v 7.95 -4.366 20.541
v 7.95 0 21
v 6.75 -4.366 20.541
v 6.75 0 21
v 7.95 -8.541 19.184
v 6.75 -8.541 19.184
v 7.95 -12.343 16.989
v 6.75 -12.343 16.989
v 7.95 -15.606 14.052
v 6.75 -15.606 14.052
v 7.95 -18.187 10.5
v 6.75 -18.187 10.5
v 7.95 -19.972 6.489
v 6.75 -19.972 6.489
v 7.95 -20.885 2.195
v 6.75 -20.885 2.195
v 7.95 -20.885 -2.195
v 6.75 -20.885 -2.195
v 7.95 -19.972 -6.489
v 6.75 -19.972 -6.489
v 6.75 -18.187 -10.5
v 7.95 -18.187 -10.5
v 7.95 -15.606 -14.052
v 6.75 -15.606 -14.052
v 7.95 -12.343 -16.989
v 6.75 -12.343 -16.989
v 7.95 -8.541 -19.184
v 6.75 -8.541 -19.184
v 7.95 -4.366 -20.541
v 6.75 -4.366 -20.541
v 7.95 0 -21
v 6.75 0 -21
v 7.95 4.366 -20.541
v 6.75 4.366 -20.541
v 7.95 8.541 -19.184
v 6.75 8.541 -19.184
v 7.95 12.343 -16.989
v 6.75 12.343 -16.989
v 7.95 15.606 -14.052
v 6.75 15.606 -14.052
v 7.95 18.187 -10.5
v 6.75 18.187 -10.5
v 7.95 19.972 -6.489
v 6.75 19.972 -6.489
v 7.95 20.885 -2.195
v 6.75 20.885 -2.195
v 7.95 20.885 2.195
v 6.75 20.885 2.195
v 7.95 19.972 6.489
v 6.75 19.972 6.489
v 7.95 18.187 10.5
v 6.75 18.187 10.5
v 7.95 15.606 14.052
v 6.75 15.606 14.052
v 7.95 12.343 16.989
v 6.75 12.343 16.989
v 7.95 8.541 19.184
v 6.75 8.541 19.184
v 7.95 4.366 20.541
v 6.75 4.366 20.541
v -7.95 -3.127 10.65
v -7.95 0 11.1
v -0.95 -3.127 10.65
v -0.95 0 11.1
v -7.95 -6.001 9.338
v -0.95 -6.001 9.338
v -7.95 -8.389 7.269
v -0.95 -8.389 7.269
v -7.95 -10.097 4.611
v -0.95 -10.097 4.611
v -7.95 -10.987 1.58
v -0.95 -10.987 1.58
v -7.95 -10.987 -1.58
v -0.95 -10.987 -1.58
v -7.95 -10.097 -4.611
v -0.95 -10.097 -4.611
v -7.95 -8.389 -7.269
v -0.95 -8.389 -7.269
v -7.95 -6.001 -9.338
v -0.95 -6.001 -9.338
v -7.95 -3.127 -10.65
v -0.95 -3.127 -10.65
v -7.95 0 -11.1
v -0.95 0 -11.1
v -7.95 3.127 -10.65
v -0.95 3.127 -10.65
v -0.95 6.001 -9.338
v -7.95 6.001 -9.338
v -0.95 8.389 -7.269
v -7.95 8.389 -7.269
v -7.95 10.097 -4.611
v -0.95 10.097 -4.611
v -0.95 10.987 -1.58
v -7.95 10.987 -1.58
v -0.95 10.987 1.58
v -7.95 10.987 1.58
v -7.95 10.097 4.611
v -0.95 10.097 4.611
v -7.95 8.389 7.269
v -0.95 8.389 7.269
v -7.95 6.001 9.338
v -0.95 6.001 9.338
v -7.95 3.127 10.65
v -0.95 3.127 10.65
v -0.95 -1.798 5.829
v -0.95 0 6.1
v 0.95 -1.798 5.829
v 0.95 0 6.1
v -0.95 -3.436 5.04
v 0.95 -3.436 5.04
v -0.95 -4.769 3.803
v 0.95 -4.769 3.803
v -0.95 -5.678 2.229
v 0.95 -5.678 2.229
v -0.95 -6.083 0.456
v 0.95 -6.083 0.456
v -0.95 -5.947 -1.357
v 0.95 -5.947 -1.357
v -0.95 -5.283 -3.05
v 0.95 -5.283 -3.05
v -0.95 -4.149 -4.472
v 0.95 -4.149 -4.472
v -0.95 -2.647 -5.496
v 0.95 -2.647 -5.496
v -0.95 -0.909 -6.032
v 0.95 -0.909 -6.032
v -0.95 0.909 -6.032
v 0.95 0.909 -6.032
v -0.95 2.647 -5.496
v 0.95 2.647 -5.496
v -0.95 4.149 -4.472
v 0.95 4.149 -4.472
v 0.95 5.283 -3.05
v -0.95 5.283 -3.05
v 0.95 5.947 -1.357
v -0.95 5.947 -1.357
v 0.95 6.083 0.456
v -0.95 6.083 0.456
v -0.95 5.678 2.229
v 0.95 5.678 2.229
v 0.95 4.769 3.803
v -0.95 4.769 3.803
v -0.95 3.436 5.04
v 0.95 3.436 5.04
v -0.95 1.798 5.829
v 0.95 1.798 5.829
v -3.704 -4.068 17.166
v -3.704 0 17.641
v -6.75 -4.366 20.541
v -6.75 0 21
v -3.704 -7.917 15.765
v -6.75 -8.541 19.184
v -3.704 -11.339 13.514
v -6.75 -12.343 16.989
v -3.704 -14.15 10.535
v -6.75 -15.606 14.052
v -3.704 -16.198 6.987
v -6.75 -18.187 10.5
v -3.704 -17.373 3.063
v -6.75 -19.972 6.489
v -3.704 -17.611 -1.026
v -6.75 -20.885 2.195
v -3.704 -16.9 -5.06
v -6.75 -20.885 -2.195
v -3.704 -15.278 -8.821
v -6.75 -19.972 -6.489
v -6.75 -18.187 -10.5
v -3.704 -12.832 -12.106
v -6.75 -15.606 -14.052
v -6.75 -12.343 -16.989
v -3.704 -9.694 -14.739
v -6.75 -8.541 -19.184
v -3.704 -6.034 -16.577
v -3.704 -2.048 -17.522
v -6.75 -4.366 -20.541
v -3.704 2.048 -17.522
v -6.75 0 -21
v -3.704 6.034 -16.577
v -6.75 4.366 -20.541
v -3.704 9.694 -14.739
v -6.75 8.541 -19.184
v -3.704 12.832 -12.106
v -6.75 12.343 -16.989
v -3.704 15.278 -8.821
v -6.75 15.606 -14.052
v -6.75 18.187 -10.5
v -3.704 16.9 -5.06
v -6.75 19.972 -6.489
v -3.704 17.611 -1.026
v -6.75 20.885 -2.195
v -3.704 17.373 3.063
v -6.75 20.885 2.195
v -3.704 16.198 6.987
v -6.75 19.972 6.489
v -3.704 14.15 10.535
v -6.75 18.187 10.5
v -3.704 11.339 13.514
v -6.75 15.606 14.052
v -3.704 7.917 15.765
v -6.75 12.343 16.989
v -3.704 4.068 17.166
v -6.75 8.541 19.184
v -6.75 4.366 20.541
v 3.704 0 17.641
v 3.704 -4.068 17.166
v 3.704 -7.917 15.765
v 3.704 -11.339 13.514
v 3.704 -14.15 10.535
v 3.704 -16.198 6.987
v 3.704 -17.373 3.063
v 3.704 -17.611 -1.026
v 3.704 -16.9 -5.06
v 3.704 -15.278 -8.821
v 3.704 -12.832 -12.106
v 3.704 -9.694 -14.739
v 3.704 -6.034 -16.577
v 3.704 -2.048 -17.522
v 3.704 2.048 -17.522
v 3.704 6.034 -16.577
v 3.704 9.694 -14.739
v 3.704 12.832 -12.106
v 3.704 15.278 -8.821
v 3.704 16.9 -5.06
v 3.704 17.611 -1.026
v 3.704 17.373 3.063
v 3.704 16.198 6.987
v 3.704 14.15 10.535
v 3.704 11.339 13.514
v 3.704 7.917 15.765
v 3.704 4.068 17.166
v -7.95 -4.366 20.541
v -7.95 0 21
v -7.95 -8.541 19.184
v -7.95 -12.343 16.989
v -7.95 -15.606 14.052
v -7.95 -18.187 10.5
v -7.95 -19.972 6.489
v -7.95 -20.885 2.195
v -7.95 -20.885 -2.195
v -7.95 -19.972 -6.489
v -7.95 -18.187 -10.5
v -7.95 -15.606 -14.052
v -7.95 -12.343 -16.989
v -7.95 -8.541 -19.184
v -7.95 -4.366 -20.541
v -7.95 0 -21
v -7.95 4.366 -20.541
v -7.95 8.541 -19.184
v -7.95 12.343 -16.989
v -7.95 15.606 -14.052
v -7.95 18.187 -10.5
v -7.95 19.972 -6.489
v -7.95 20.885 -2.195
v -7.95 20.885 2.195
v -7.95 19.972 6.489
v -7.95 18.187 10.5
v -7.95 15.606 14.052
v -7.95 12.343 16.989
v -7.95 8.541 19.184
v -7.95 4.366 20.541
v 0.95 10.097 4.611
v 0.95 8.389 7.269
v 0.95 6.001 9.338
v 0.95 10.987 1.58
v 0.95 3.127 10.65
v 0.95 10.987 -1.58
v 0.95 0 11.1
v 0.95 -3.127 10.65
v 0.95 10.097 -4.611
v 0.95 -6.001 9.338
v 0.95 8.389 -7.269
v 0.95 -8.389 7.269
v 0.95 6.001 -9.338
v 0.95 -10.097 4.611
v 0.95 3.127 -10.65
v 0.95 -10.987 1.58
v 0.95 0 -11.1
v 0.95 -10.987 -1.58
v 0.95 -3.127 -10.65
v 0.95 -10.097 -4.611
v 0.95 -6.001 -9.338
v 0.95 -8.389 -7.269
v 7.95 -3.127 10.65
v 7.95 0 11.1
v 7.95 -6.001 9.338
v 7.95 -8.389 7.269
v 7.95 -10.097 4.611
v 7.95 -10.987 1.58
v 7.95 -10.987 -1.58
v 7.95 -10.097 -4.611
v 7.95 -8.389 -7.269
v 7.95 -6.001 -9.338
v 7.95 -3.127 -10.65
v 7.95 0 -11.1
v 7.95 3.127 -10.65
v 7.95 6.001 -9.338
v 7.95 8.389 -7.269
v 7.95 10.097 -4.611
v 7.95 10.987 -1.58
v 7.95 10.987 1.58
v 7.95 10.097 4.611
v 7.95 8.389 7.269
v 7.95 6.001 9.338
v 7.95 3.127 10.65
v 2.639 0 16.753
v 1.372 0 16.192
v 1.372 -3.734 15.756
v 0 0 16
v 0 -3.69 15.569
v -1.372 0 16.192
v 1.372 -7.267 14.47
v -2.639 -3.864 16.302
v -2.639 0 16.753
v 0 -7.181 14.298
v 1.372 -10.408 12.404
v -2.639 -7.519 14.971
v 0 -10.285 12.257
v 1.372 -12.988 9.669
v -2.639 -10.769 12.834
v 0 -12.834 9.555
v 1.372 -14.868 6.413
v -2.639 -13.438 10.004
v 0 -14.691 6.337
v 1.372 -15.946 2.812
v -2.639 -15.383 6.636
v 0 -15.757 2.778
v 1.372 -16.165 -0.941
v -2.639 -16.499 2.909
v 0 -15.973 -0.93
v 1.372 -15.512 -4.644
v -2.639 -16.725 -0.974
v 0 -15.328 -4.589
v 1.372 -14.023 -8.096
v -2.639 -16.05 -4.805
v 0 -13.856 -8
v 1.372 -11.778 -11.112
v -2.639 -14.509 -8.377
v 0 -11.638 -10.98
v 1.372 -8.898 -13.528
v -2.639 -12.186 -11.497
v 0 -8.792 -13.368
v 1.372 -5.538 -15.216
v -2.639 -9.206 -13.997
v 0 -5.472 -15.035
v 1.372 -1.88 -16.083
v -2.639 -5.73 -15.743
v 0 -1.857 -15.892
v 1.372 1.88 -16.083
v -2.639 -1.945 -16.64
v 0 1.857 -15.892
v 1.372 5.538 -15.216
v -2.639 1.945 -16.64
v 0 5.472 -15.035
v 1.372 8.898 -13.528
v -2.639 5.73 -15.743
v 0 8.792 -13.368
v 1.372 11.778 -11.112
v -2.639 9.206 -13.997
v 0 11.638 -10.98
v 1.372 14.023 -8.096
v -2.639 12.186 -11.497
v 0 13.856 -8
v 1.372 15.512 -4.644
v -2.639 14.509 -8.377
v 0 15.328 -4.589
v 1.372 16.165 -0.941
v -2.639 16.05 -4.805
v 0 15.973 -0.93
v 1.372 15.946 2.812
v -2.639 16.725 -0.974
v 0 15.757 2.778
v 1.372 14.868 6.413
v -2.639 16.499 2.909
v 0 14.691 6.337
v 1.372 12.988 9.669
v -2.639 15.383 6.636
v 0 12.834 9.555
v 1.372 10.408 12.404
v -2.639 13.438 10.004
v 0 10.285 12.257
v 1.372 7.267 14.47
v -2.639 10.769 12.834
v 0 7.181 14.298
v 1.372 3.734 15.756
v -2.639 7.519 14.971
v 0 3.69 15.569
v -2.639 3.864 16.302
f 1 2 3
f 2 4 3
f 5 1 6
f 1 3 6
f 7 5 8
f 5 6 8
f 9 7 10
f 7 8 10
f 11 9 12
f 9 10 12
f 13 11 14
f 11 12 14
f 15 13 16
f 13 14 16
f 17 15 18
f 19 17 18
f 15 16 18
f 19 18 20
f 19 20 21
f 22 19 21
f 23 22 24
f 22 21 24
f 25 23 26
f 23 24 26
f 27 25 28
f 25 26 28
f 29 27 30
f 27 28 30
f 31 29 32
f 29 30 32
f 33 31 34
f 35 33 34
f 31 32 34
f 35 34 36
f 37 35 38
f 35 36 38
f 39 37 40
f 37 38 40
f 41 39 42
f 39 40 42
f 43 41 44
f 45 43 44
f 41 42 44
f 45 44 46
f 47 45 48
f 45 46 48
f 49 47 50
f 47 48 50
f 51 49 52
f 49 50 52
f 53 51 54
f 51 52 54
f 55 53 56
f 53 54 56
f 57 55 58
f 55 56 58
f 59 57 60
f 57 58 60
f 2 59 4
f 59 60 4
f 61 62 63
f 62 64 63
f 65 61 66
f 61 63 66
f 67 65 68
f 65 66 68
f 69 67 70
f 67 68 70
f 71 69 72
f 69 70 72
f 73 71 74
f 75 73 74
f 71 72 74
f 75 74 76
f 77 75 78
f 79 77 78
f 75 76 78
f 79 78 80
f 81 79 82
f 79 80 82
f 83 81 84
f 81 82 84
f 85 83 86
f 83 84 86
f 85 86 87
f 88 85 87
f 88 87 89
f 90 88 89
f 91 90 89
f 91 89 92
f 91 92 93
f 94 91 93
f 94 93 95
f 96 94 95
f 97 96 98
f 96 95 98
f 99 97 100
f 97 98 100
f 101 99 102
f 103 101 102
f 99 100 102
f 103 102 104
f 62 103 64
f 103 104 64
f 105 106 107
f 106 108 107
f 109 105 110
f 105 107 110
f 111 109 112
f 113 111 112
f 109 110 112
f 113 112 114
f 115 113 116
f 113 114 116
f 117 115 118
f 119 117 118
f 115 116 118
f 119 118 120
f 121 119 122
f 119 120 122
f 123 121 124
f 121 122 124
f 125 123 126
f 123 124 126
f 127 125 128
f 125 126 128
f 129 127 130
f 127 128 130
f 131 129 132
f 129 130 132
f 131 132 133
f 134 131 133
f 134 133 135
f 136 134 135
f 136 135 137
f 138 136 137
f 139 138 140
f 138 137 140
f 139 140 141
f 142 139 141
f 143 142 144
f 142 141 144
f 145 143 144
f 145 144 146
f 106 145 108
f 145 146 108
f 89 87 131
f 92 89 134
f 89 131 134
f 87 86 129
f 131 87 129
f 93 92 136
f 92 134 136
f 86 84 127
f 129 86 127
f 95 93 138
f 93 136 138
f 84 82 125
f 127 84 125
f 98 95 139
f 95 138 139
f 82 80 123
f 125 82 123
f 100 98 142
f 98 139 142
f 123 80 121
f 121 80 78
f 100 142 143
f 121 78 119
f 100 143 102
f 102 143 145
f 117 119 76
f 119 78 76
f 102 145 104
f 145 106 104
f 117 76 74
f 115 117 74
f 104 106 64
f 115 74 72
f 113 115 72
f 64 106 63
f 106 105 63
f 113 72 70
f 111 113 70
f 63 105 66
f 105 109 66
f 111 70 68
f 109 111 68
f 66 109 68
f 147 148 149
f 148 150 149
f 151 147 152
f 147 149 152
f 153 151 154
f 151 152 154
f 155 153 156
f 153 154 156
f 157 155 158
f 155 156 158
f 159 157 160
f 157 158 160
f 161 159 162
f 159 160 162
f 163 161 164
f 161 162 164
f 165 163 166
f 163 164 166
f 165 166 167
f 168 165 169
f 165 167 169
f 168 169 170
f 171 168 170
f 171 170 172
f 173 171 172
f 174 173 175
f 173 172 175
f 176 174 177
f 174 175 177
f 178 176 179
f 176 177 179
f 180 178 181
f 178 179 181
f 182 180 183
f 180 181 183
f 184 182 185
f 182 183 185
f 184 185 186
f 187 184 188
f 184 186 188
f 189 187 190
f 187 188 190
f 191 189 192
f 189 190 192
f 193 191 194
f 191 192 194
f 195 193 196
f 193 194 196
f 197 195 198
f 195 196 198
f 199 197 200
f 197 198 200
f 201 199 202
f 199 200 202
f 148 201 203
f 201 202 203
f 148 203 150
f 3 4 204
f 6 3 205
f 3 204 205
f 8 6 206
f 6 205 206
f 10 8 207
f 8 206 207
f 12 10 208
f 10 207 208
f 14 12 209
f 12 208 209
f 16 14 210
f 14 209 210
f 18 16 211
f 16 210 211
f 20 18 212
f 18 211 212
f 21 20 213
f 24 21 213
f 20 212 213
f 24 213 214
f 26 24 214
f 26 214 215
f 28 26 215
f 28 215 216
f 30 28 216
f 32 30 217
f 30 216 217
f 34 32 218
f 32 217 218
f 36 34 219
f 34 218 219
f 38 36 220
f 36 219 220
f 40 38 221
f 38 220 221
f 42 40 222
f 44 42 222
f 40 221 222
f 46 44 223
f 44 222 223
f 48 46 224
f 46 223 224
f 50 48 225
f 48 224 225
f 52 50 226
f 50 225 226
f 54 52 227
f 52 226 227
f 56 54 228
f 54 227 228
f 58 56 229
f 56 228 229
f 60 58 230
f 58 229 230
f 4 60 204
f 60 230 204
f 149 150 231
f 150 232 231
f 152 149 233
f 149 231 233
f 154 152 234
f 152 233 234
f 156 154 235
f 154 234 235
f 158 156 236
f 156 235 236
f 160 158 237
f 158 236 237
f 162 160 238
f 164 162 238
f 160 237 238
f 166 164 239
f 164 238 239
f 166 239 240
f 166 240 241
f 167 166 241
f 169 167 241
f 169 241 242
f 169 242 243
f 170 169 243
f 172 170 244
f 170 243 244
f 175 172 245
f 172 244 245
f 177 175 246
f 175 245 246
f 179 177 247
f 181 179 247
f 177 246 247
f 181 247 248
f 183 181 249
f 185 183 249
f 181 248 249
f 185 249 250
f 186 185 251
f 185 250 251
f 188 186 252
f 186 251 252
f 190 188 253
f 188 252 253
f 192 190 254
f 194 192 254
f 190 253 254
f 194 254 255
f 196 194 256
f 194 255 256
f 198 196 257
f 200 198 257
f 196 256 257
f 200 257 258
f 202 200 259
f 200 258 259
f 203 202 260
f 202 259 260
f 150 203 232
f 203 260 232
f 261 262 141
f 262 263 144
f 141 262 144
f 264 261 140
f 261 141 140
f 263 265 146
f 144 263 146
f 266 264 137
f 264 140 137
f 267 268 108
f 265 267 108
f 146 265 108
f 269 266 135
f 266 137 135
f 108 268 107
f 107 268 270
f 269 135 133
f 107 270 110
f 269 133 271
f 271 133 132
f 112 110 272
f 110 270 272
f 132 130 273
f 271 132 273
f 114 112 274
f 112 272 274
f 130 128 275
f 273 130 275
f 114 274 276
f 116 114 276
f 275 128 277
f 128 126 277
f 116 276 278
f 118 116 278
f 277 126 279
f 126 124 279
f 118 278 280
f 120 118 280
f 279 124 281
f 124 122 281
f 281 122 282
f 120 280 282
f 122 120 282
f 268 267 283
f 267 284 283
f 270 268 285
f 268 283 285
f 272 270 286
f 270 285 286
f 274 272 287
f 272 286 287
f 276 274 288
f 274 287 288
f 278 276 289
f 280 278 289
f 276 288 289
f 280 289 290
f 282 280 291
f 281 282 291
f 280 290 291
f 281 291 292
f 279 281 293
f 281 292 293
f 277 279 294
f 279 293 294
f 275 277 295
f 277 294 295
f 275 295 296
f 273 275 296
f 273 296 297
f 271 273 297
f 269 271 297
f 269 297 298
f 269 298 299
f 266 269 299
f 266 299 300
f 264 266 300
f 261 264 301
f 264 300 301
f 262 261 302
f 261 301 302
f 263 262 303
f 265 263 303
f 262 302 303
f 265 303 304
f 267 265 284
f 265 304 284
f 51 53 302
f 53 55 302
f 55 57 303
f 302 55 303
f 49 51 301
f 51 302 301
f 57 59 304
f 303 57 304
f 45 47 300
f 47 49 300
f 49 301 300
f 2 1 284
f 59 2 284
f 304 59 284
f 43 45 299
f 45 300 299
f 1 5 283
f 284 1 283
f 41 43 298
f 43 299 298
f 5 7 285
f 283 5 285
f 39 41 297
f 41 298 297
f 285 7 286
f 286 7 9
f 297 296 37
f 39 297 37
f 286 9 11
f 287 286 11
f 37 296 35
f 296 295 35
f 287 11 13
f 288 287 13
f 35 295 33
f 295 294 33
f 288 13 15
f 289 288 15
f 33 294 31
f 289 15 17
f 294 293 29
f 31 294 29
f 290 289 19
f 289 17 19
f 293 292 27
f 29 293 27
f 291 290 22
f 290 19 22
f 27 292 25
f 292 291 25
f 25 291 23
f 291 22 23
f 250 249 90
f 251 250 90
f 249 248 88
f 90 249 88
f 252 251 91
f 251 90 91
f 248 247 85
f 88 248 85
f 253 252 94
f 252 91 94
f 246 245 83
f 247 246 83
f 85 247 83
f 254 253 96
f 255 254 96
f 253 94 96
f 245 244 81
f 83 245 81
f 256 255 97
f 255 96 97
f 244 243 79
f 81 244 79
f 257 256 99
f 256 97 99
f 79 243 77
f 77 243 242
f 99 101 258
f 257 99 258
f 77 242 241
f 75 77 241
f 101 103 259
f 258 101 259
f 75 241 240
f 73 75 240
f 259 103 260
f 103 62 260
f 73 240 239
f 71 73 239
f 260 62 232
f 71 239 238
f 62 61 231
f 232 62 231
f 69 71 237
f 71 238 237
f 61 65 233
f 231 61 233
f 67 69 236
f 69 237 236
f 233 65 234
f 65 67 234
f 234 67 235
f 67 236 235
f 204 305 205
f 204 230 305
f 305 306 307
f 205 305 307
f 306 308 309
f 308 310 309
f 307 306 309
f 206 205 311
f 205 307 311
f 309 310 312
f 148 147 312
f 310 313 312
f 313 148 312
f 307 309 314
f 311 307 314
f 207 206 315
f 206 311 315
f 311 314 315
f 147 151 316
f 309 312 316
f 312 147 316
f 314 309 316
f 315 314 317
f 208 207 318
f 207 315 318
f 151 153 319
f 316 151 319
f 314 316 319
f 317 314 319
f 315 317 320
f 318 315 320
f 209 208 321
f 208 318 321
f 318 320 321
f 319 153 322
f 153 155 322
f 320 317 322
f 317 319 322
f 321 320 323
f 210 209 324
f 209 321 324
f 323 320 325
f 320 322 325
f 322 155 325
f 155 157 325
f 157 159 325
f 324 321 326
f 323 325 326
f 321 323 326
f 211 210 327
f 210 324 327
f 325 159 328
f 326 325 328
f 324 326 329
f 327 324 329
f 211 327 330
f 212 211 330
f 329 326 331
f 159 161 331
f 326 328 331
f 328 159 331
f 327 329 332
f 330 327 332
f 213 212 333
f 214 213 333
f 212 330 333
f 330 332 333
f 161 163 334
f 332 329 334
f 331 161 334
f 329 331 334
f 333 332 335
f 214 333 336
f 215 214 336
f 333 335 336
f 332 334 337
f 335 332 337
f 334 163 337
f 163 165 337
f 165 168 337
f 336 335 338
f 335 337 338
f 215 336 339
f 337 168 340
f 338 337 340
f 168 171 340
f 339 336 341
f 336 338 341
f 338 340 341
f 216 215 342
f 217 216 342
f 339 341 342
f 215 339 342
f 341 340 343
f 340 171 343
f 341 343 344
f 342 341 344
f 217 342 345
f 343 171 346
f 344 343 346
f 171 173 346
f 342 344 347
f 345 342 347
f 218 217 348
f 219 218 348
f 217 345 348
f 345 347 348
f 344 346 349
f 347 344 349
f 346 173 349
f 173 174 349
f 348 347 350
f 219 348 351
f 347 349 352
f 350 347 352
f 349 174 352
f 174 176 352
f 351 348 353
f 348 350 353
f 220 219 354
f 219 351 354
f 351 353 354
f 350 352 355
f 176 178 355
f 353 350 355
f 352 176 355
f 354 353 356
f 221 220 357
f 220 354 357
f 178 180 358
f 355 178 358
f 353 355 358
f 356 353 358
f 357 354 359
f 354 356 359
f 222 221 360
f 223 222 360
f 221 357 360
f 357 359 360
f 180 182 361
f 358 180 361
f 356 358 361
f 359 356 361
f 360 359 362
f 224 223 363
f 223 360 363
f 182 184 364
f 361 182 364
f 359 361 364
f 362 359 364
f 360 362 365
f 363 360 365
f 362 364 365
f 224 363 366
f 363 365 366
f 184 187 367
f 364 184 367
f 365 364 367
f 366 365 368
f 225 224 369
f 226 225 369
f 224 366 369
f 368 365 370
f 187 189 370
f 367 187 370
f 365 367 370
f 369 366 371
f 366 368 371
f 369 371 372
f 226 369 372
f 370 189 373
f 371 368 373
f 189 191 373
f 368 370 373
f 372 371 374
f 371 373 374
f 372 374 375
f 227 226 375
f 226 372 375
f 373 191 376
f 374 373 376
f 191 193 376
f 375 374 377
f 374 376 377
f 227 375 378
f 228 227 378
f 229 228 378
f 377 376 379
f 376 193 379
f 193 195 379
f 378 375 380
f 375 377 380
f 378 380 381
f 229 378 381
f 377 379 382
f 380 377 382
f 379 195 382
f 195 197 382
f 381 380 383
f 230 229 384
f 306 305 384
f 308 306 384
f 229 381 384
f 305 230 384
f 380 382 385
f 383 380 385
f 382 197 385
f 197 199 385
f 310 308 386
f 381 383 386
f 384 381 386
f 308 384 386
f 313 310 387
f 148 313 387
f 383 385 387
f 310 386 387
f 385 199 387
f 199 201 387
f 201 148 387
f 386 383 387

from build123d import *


with BuildPart() as part:
    # Sketch1 → Revolve1 (revolve)
    with BuildSketch(Plane(origin=(0, 0, 0), x_dir=(1, 0, 0), z_dir=(0, 1, 0)), mode=Mode.PRIVATE) as revolve1_sk:
        with BuildLine():
            Line((-7.95, 11.1), (-0.95, 11.1))
            Line((-0.95, 11.1), (-0.95, 6.1))
            Line((-0.95, 6.1), (0.95, 6.1))
            Line((0.95, 6.1), (0.95, 11.1))
            Line((0.95, 11.1), (7.95, 11.1))
            Line((7.95, 11.1), (7.95, 21))
            Line((7.95, 21), (6.75, 21))
            Line((6.75, 21), (3.703703704, 17.641044973))
            ThreePointArc((3.703703704, 17.641044973), (0, 16), (-3.703703704, 17.641044973))
            Line((-3.703703704, 17.641044973), (-6.75, 21))
            Line((-6.75, 21), (-7.95, 21))
            Line((-7.95, 21), (-7.95, 11.1))
        make_face()
    revolve(revolve1_sk.sketch.rotate(Axis((-3.715814159, 0, 0), (1, 0, 0)), 180), axis=Axis((-3.715814159, 0, 0), (1, 0, 0)))


solid = part.part
